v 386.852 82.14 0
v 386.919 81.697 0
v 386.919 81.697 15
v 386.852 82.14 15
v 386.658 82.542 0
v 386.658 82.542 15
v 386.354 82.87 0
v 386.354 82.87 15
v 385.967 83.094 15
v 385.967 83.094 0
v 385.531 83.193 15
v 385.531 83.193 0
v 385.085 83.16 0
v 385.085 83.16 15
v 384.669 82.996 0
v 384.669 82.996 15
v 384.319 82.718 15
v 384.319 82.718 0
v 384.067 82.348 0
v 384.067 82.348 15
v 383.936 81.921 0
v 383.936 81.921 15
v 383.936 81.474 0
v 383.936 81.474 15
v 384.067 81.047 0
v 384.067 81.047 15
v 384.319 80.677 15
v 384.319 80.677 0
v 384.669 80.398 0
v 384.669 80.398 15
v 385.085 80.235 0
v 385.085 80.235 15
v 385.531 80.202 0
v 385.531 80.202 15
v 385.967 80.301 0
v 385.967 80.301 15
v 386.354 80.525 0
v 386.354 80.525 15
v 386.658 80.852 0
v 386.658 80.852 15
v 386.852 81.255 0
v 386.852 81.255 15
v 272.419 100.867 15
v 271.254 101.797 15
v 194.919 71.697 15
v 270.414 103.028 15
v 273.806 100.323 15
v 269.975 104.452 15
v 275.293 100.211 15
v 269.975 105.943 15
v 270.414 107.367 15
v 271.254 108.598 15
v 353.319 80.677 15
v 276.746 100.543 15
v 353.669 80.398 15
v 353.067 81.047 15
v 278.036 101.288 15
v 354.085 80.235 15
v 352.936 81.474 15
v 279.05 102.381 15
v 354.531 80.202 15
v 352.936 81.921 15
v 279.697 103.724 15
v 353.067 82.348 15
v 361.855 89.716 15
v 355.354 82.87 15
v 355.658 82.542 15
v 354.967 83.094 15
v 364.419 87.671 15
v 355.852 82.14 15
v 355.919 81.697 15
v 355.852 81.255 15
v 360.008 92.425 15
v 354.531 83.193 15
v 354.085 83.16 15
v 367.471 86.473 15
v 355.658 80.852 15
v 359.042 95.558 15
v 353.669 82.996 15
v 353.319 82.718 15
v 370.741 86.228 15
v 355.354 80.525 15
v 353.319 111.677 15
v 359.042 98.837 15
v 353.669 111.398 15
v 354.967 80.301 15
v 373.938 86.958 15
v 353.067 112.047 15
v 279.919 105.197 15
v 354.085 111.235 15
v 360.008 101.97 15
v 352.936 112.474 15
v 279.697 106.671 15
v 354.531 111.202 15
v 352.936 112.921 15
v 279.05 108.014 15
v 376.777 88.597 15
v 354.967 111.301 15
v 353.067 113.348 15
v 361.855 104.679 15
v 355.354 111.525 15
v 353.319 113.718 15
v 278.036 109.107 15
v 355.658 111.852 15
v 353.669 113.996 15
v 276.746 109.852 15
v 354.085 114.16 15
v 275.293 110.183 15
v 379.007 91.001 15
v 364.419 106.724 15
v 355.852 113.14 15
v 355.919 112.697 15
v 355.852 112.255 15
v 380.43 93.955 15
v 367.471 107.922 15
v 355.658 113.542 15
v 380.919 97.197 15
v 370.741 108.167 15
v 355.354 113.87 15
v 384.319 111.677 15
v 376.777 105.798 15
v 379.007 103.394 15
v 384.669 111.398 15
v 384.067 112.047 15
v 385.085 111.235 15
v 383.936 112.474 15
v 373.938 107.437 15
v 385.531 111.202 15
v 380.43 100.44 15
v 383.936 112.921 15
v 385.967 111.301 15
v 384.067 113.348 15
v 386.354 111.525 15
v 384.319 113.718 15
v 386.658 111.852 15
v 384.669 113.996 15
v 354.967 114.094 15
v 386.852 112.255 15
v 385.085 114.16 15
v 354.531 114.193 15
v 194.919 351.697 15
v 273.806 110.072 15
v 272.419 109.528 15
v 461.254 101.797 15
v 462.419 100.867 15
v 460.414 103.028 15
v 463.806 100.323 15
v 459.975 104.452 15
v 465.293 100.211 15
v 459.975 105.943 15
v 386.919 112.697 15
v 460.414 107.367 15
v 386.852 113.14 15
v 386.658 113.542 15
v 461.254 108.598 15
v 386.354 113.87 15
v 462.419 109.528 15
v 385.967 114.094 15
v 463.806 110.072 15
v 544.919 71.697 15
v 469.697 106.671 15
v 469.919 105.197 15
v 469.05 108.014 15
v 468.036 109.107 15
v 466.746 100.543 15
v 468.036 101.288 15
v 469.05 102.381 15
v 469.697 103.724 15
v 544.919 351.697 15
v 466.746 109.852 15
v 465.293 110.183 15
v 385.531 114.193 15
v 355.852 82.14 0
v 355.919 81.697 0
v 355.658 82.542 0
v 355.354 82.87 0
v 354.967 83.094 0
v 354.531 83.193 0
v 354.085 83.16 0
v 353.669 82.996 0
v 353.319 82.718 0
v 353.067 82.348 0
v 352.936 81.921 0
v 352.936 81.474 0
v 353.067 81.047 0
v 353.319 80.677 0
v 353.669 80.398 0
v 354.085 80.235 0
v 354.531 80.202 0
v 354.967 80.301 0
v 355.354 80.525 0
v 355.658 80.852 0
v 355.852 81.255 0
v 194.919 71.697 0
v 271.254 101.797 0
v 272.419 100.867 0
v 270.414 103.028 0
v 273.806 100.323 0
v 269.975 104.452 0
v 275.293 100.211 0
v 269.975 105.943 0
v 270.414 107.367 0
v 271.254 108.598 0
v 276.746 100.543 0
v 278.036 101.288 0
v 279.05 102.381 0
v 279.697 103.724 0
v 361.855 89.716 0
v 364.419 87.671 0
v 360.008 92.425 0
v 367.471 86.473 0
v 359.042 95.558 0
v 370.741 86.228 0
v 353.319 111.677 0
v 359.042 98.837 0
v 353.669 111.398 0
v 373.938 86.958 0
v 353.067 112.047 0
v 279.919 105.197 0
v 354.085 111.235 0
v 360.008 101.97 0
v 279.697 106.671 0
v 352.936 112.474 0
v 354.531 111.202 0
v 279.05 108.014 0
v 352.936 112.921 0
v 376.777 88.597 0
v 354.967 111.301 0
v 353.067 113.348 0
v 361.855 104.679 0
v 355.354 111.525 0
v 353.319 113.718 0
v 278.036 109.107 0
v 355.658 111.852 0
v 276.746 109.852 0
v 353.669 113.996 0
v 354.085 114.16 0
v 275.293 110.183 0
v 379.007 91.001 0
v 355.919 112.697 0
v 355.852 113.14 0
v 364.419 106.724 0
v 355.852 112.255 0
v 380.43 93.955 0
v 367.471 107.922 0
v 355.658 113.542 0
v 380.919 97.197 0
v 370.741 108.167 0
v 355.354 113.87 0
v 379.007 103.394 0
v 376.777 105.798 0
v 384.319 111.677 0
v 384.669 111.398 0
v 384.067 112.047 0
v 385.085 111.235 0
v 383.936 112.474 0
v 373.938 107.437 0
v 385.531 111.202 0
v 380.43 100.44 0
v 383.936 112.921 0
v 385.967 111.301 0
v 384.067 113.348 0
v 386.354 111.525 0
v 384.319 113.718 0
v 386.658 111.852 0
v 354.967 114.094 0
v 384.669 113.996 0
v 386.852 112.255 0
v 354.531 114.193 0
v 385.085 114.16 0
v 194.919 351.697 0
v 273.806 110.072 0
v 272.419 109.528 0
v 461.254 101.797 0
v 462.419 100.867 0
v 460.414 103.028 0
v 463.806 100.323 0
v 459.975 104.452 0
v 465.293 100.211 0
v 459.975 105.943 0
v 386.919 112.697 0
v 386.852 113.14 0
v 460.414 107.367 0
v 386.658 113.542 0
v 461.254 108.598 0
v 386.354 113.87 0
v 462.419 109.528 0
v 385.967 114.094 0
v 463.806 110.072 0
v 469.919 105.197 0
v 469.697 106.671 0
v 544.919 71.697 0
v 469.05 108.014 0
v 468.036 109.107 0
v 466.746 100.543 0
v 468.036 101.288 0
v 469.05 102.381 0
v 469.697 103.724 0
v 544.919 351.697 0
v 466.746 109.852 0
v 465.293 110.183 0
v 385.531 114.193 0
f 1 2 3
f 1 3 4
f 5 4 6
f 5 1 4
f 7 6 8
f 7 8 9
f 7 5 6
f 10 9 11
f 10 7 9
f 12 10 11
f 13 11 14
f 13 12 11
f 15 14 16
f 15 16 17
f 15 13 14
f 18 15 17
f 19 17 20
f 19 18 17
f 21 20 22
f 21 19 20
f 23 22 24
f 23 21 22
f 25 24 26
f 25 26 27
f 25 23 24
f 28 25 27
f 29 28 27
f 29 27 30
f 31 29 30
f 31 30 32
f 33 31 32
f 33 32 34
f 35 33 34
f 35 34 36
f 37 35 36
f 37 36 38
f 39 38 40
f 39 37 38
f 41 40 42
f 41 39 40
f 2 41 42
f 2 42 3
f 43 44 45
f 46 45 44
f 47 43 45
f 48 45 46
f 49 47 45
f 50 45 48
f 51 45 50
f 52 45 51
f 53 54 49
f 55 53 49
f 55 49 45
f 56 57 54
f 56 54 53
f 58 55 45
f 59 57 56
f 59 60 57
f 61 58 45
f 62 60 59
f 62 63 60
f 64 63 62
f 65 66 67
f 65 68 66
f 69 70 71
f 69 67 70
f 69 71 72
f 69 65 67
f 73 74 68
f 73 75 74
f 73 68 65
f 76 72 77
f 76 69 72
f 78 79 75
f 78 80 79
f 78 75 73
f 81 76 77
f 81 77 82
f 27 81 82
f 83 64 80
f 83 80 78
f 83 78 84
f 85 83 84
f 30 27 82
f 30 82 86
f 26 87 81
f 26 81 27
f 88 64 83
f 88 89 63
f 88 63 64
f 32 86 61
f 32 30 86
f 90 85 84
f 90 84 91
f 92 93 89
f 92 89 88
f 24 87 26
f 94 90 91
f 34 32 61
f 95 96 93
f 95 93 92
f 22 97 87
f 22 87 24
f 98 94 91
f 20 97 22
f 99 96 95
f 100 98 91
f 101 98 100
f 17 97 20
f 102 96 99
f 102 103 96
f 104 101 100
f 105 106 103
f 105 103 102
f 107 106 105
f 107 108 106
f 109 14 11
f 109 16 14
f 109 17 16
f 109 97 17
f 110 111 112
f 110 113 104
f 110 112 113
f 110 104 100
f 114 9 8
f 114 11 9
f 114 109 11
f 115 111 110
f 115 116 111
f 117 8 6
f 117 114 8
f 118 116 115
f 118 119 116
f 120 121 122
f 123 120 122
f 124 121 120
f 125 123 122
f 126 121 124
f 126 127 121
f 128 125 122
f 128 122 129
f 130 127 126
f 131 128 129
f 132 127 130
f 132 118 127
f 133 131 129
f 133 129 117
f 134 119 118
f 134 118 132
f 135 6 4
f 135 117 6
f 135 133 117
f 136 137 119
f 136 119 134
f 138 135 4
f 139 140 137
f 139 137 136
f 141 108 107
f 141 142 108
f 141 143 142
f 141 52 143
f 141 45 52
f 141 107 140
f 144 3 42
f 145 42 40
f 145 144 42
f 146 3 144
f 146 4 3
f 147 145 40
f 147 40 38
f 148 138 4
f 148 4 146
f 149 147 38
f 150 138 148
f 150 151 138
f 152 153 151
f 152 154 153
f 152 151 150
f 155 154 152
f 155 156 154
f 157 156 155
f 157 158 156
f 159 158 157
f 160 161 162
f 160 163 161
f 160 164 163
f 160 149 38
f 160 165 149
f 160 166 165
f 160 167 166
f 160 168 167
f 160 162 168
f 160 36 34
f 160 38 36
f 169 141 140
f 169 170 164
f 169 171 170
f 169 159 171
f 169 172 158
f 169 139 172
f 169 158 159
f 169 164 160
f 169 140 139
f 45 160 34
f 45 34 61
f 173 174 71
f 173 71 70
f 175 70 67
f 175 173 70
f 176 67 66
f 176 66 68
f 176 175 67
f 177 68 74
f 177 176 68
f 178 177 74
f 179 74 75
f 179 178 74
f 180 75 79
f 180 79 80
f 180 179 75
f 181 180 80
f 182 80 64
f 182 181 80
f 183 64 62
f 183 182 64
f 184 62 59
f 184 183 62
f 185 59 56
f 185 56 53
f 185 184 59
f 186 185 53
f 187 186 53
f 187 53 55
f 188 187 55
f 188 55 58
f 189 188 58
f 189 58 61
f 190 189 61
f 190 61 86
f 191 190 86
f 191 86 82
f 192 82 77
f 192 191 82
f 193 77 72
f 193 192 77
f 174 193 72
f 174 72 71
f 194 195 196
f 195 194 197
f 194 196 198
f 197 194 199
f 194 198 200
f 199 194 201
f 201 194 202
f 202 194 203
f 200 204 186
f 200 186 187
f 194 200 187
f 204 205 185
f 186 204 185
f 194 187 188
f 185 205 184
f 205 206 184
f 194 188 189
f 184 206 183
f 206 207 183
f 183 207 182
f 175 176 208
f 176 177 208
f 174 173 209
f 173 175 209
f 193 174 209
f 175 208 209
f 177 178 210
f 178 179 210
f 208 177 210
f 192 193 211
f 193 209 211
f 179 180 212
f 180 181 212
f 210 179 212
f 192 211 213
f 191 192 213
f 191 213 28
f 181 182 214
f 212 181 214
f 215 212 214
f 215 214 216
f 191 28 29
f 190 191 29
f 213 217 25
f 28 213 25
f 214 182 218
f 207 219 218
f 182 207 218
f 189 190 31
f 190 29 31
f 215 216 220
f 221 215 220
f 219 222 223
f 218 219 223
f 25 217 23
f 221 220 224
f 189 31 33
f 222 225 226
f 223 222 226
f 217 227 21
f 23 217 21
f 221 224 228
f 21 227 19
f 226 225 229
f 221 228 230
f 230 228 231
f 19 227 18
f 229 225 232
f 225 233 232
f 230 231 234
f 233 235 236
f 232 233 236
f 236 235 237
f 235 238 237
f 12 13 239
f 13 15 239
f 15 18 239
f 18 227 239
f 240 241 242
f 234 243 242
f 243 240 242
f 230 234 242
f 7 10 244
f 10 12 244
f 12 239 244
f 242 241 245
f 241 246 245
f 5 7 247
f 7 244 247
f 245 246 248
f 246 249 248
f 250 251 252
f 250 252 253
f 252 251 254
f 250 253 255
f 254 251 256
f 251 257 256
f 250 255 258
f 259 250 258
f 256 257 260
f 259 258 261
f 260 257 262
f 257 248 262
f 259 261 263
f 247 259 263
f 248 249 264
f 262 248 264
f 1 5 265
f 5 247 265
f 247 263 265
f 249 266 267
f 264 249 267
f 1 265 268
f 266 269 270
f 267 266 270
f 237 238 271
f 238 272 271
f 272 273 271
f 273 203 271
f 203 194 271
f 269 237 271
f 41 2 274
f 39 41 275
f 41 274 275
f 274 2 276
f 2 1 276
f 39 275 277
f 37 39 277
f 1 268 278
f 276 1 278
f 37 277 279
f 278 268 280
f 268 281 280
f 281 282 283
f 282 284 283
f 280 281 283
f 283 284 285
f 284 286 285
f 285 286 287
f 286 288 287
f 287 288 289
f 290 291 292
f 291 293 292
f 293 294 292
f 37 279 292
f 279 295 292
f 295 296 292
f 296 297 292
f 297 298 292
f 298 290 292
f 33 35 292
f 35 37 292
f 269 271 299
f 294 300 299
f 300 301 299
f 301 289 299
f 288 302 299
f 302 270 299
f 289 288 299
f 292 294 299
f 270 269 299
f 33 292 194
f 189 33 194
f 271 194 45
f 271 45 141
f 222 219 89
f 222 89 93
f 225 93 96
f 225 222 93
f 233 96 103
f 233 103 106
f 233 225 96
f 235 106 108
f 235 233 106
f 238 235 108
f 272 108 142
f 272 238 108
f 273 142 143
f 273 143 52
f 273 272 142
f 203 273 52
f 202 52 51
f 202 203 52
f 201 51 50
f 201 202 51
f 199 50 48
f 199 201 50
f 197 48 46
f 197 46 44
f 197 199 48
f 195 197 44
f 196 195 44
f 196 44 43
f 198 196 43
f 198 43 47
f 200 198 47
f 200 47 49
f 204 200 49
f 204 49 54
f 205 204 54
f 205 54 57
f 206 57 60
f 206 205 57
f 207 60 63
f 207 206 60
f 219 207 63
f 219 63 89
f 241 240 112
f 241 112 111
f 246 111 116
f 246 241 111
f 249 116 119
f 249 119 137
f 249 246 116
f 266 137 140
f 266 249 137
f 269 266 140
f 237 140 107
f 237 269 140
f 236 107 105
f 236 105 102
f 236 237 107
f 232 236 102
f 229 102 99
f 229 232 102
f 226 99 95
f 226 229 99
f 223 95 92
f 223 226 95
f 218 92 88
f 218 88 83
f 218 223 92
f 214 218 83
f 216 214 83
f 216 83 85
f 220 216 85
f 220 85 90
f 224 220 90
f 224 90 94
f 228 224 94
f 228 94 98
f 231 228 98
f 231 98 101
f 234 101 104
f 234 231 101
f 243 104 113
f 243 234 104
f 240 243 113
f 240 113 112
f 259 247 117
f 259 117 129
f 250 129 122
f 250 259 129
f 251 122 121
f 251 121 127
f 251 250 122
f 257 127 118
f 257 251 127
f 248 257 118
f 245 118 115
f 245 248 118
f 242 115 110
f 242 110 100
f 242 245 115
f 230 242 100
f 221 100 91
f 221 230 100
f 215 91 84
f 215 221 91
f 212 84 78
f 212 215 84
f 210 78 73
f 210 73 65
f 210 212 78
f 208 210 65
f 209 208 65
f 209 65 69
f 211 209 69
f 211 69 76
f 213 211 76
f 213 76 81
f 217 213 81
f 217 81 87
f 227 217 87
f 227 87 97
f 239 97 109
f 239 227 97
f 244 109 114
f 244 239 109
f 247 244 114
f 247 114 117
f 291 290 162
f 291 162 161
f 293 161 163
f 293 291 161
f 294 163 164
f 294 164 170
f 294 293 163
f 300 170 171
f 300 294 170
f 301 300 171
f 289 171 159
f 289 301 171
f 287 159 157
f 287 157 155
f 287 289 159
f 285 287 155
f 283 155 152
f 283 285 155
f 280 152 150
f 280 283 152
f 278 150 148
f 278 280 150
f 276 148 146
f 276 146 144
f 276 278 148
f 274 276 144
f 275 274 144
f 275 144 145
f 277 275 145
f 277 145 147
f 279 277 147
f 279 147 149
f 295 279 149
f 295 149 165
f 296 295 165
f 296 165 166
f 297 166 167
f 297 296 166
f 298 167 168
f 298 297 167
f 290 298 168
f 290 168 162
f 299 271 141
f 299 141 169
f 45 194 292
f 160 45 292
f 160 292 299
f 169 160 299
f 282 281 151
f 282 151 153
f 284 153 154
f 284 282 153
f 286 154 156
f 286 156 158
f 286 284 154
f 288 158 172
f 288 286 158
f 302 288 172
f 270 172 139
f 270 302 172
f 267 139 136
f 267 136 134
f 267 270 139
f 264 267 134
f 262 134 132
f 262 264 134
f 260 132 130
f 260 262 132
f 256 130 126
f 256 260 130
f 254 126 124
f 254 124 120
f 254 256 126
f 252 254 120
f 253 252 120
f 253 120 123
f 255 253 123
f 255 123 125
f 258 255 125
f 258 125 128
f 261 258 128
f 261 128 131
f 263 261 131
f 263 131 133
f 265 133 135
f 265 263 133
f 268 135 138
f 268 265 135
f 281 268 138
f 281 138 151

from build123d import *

# Parameters (mm, degrees)
SKETCH3_W           = 350
SKETCH3_H           = 280
SKETCH3_R           = 1.5
SKETCH3_R_2         = 11
SKETCH3_R_3         = 5
BOSS_EXTRUDE3_DEPTH = 15


with BuildPart() as part:
    # Sketch3 → Boss-Extrude3 (new body)
    with BuildSketch(Plane.XY):
        with Locations((369.918861249, 211.697453917)):
            Rectangle(SKETCH3_W, SKETCH3_H)
        with Locations((354.418861249, 112.697453917)):
            Circle(SKETCH3_R, mode=Mode.SUBTRACT)
        with Locations((385.418861249, 112.697453917)):
            Circle(SKETCH3_R, mode=Mode.SUBTRACT)
        with Locations((354.418861249, 81.697453917)):
            Circle(SKETCH3_R, mode=Mode.SUBTRACT)
        with Locations((385.418861249, 81.697453917)):
            Circle(SKETCH3_R, mode=Mode.SUBTRACT)
        with Locations((369.918861249, 97.197453917)):
            Circle(SKETCH3_R_2, mode=Mode.SUBTRACT)
        with Locations((274.918861249, 105.197453917)):
            Circle(SKETCH3_R_3, mode=Mode.SUBTRACT)
        with Locations((464.918861249, 105.197453917)):
            Circle(SKETCH3_R_3, mode=Mode.SUBTRACT)
    extrude(amount=BOSS_EXTRUDE3_DEPTH)


solid = part.part
